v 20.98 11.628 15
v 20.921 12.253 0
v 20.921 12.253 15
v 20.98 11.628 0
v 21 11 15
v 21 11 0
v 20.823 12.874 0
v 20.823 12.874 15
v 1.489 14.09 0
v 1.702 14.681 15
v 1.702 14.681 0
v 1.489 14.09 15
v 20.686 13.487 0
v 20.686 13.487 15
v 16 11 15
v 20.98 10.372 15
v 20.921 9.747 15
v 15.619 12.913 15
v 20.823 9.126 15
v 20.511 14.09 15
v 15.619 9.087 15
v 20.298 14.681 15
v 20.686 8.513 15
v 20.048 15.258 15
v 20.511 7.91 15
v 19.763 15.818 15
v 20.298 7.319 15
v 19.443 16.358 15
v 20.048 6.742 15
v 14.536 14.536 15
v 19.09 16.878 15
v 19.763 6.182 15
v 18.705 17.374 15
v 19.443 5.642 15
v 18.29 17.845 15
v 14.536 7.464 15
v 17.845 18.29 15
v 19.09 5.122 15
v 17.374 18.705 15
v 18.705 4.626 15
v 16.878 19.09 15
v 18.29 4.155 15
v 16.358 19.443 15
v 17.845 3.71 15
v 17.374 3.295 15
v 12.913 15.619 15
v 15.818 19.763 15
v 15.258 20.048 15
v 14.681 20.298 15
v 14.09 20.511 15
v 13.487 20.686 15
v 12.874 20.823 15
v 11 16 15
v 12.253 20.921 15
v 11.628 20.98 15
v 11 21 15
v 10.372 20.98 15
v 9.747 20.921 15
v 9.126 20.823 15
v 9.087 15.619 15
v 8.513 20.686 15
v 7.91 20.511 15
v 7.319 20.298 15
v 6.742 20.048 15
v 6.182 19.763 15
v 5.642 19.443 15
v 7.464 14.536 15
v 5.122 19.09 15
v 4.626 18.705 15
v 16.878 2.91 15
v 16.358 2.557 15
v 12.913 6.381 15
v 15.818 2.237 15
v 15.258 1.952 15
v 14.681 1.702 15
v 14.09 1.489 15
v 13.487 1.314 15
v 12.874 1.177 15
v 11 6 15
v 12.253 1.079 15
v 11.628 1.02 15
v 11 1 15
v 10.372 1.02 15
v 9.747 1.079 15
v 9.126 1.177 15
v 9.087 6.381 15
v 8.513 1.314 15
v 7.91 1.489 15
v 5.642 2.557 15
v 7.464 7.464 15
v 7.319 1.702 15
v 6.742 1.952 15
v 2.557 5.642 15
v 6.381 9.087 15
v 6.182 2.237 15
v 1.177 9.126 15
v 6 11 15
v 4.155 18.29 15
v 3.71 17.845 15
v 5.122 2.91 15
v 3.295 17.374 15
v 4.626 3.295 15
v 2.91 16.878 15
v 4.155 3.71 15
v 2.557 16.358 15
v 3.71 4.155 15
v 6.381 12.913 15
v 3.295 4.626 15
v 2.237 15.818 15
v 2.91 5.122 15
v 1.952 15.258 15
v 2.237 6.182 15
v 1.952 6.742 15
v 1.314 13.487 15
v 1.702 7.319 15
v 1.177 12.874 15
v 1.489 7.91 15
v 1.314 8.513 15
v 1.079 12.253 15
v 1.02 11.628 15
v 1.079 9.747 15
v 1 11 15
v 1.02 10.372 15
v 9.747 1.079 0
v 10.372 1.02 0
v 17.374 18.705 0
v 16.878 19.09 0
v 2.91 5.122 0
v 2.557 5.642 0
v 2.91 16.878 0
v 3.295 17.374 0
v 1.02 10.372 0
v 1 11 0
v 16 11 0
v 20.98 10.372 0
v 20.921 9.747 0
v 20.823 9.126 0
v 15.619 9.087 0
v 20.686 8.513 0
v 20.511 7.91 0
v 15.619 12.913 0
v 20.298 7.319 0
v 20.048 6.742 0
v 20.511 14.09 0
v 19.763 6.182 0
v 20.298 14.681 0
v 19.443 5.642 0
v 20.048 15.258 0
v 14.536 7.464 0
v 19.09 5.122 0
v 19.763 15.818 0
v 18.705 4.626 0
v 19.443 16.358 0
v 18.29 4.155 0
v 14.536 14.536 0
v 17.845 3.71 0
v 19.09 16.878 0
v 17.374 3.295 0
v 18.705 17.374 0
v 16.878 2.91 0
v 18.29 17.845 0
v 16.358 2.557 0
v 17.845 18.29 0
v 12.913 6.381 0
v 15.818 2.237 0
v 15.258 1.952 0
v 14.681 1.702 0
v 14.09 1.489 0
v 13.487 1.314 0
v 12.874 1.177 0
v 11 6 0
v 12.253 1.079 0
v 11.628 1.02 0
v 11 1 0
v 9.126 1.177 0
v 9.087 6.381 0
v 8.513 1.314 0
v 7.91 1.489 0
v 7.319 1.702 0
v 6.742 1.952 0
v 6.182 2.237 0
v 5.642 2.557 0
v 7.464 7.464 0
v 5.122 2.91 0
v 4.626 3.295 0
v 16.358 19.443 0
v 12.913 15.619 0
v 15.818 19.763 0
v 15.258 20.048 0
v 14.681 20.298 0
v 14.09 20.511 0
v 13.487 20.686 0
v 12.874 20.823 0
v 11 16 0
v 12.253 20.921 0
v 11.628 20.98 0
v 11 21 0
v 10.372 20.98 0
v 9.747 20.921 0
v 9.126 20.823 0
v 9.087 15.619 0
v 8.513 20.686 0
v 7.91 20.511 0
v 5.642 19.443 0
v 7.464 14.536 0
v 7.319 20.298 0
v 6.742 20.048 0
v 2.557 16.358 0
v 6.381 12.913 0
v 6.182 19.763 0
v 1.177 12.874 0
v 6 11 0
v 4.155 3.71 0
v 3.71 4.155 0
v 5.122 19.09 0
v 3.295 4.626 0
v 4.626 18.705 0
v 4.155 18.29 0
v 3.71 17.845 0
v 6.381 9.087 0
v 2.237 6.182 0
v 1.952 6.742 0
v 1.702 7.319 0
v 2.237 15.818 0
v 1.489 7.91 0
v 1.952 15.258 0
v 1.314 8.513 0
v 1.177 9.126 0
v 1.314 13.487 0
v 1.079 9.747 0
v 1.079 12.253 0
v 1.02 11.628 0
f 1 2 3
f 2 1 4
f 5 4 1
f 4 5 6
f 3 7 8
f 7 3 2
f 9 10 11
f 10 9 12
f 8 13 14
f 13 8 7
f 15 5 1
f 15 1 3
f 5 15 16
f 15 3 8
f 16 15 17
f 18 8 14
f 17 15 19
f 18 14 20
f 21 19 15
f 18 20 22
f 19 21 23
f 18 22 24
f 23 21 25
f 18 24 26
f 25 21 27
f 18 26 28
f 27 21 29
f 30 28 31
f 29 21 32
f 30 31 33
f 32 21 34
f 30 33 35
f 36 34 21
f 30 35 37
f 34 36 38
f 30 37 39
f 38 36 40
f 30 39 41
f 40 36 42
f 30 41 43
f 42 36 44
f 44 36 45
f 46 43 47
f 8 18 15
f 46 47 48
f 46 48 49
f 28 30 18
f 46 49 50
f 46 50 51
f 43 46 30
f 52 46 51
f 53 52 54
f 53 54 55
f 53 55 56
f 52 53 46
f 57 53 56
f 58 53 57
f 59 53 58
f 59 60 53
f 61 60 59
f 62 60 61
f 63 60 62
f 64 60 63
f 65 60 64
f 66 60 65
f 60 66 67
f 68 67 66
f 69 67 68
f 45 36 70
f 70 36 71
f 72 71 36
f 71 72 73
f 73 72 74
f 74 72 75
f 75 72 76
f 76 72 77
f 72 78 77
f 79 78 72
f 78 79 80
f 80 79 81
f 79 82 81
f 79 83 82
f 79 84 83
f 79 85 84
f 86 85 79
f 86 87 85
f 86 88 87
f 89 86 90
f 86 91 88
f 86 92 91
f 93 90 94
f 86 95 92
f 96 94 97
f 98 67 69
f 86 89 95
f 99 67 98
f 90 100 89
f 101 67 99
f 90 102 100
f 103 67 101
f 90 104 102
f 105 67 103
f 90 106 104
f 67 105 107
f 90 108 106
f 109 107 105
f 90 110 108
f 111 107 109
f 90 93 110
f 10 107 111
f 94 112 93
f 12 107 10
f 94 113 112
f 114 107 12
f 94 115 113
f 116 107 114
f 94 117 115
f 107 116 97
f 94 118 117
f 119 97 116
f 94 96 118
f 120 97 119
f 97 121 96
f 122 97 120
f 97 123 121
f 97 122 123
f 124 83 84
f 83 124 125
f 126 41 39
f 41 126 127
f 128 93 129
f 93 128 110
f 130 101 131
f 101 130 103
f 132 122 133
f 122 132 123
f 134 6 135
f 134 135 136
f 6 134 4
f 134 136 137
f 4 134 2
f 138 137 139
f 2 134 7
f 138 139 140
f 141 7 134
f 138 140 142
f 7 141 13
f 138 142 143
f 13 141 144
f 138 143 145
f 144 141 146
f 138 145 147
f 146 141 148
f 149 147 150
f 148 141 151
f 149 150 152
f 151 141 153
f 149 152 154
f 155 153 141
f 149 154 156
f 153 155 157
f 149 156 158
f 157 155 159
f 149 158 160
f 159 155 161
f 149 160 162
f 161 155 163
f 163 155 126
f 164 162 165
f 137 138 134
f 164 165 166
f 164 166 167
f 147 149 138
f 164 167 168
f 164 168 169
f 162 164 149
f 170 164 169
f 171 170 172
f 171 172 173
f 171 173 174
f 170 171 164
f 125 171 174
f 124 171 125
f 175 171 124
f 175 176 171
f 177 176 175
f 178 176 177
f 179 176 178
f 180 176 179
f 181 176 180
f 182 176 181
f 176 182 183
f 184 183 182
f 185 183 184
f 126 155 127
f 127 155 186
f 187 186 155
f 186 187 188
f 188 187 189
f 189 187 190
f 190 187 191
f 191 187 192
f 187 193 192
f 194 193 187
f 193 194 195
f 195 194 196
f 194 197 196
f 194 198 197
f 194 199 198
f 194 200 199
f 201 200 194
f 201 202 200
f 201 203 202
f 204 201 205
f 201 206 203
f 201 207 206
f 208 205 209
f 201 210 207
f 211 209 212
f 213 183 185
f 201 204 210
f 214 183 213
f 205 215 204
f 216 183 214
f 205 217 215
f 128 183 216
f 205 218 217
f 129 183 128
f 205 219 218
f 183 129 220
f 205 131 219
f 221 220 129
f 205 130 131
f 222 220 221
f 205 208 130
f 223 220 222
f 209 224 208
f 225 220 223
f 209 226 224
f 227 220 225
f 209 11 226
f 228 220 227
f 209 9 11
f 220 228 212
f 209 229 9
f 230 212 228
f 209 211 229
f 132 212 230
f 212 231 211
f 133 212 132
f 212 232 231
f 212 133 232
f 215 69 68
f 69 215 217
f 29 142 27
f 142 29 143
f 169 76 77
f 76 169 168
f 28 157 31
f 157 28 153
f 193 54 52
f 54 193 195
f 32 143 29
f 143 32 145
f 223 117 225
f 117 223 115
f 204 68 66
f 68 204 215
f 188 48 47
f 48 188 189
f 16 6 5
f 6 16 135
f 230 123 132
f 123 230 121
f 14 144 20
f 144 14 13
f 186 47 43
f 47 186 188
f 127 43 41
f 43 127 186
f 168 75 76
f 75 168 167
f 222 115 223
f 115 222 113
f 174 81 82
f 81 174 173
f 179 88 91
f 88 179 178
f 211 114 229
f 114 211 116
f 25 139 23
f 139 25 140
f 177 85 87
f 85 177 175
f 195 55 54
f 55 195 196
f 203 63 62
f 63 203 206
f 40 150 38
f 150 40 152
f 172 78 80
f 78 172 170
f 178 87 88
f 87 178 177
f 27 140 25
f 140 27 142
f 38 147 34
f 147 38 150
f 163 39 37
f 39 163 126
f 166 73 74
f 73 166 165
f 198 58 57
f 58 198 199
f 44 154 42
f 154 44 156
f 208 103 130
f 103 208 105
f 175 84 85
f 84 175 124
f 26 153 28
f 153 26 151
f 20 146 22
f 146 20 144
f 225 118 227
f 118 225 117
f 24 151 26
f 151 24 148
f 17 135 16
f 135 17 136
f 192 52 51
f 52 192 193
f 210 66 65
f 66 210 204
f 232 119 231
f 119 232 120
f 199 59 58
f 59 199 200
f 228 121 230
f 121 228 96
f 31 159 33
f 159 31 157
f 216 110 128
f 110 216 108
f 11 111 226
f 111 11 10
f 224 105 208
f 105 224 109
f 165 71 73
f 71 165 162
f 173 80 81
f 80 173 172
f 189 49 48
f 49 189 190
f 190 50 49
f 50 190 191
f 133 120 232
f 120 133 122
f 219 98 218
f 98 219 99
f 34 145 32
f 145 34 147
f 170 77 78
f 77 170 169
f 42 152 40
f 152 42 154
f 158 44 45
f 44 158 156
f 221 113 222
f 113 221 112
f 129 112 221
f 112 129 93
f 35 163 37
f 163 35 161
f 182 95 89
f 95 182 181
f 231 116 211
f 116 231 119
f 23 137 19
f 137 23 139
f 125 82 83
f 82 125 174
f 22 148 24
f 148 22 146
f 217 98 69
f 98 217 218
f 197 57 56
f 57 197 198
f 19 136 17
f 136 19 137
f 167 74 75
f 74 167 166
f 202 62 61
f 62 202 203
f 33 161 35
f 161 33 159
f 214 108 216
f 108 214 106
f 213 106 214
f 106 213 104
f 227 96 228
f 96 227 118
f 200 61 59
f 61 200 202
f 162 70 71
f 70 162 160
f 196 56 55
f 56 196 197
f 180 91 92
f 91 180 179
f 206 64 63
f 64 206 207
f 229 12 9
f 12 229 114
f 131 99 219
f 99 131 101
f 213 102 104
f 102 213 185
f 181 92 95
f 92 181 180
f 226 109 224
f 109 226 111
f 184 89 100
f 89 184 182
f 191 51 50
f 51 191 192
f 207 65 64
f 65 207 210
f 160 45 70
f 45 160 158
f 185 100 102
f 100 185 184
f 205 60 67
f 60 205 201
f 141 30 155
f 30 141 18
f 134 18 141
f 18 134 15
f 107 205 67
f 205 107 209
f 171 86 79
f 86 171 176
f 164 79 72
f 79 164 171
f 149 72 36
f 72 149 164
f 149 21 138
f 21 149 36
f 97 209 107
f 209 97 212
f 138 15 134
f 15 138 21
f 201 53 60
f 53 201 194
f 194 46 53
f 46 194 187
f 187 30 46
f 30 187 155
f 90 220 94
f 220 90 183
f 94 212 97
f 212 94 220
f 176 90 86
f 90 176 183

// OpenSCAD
translate([11, 11, 0]) {    
    difference() {
        cylinder(r=10, h=15, $fn=100);
        translate([0,0,-1])
            cylinder(r=5, h=17);
    }
}
